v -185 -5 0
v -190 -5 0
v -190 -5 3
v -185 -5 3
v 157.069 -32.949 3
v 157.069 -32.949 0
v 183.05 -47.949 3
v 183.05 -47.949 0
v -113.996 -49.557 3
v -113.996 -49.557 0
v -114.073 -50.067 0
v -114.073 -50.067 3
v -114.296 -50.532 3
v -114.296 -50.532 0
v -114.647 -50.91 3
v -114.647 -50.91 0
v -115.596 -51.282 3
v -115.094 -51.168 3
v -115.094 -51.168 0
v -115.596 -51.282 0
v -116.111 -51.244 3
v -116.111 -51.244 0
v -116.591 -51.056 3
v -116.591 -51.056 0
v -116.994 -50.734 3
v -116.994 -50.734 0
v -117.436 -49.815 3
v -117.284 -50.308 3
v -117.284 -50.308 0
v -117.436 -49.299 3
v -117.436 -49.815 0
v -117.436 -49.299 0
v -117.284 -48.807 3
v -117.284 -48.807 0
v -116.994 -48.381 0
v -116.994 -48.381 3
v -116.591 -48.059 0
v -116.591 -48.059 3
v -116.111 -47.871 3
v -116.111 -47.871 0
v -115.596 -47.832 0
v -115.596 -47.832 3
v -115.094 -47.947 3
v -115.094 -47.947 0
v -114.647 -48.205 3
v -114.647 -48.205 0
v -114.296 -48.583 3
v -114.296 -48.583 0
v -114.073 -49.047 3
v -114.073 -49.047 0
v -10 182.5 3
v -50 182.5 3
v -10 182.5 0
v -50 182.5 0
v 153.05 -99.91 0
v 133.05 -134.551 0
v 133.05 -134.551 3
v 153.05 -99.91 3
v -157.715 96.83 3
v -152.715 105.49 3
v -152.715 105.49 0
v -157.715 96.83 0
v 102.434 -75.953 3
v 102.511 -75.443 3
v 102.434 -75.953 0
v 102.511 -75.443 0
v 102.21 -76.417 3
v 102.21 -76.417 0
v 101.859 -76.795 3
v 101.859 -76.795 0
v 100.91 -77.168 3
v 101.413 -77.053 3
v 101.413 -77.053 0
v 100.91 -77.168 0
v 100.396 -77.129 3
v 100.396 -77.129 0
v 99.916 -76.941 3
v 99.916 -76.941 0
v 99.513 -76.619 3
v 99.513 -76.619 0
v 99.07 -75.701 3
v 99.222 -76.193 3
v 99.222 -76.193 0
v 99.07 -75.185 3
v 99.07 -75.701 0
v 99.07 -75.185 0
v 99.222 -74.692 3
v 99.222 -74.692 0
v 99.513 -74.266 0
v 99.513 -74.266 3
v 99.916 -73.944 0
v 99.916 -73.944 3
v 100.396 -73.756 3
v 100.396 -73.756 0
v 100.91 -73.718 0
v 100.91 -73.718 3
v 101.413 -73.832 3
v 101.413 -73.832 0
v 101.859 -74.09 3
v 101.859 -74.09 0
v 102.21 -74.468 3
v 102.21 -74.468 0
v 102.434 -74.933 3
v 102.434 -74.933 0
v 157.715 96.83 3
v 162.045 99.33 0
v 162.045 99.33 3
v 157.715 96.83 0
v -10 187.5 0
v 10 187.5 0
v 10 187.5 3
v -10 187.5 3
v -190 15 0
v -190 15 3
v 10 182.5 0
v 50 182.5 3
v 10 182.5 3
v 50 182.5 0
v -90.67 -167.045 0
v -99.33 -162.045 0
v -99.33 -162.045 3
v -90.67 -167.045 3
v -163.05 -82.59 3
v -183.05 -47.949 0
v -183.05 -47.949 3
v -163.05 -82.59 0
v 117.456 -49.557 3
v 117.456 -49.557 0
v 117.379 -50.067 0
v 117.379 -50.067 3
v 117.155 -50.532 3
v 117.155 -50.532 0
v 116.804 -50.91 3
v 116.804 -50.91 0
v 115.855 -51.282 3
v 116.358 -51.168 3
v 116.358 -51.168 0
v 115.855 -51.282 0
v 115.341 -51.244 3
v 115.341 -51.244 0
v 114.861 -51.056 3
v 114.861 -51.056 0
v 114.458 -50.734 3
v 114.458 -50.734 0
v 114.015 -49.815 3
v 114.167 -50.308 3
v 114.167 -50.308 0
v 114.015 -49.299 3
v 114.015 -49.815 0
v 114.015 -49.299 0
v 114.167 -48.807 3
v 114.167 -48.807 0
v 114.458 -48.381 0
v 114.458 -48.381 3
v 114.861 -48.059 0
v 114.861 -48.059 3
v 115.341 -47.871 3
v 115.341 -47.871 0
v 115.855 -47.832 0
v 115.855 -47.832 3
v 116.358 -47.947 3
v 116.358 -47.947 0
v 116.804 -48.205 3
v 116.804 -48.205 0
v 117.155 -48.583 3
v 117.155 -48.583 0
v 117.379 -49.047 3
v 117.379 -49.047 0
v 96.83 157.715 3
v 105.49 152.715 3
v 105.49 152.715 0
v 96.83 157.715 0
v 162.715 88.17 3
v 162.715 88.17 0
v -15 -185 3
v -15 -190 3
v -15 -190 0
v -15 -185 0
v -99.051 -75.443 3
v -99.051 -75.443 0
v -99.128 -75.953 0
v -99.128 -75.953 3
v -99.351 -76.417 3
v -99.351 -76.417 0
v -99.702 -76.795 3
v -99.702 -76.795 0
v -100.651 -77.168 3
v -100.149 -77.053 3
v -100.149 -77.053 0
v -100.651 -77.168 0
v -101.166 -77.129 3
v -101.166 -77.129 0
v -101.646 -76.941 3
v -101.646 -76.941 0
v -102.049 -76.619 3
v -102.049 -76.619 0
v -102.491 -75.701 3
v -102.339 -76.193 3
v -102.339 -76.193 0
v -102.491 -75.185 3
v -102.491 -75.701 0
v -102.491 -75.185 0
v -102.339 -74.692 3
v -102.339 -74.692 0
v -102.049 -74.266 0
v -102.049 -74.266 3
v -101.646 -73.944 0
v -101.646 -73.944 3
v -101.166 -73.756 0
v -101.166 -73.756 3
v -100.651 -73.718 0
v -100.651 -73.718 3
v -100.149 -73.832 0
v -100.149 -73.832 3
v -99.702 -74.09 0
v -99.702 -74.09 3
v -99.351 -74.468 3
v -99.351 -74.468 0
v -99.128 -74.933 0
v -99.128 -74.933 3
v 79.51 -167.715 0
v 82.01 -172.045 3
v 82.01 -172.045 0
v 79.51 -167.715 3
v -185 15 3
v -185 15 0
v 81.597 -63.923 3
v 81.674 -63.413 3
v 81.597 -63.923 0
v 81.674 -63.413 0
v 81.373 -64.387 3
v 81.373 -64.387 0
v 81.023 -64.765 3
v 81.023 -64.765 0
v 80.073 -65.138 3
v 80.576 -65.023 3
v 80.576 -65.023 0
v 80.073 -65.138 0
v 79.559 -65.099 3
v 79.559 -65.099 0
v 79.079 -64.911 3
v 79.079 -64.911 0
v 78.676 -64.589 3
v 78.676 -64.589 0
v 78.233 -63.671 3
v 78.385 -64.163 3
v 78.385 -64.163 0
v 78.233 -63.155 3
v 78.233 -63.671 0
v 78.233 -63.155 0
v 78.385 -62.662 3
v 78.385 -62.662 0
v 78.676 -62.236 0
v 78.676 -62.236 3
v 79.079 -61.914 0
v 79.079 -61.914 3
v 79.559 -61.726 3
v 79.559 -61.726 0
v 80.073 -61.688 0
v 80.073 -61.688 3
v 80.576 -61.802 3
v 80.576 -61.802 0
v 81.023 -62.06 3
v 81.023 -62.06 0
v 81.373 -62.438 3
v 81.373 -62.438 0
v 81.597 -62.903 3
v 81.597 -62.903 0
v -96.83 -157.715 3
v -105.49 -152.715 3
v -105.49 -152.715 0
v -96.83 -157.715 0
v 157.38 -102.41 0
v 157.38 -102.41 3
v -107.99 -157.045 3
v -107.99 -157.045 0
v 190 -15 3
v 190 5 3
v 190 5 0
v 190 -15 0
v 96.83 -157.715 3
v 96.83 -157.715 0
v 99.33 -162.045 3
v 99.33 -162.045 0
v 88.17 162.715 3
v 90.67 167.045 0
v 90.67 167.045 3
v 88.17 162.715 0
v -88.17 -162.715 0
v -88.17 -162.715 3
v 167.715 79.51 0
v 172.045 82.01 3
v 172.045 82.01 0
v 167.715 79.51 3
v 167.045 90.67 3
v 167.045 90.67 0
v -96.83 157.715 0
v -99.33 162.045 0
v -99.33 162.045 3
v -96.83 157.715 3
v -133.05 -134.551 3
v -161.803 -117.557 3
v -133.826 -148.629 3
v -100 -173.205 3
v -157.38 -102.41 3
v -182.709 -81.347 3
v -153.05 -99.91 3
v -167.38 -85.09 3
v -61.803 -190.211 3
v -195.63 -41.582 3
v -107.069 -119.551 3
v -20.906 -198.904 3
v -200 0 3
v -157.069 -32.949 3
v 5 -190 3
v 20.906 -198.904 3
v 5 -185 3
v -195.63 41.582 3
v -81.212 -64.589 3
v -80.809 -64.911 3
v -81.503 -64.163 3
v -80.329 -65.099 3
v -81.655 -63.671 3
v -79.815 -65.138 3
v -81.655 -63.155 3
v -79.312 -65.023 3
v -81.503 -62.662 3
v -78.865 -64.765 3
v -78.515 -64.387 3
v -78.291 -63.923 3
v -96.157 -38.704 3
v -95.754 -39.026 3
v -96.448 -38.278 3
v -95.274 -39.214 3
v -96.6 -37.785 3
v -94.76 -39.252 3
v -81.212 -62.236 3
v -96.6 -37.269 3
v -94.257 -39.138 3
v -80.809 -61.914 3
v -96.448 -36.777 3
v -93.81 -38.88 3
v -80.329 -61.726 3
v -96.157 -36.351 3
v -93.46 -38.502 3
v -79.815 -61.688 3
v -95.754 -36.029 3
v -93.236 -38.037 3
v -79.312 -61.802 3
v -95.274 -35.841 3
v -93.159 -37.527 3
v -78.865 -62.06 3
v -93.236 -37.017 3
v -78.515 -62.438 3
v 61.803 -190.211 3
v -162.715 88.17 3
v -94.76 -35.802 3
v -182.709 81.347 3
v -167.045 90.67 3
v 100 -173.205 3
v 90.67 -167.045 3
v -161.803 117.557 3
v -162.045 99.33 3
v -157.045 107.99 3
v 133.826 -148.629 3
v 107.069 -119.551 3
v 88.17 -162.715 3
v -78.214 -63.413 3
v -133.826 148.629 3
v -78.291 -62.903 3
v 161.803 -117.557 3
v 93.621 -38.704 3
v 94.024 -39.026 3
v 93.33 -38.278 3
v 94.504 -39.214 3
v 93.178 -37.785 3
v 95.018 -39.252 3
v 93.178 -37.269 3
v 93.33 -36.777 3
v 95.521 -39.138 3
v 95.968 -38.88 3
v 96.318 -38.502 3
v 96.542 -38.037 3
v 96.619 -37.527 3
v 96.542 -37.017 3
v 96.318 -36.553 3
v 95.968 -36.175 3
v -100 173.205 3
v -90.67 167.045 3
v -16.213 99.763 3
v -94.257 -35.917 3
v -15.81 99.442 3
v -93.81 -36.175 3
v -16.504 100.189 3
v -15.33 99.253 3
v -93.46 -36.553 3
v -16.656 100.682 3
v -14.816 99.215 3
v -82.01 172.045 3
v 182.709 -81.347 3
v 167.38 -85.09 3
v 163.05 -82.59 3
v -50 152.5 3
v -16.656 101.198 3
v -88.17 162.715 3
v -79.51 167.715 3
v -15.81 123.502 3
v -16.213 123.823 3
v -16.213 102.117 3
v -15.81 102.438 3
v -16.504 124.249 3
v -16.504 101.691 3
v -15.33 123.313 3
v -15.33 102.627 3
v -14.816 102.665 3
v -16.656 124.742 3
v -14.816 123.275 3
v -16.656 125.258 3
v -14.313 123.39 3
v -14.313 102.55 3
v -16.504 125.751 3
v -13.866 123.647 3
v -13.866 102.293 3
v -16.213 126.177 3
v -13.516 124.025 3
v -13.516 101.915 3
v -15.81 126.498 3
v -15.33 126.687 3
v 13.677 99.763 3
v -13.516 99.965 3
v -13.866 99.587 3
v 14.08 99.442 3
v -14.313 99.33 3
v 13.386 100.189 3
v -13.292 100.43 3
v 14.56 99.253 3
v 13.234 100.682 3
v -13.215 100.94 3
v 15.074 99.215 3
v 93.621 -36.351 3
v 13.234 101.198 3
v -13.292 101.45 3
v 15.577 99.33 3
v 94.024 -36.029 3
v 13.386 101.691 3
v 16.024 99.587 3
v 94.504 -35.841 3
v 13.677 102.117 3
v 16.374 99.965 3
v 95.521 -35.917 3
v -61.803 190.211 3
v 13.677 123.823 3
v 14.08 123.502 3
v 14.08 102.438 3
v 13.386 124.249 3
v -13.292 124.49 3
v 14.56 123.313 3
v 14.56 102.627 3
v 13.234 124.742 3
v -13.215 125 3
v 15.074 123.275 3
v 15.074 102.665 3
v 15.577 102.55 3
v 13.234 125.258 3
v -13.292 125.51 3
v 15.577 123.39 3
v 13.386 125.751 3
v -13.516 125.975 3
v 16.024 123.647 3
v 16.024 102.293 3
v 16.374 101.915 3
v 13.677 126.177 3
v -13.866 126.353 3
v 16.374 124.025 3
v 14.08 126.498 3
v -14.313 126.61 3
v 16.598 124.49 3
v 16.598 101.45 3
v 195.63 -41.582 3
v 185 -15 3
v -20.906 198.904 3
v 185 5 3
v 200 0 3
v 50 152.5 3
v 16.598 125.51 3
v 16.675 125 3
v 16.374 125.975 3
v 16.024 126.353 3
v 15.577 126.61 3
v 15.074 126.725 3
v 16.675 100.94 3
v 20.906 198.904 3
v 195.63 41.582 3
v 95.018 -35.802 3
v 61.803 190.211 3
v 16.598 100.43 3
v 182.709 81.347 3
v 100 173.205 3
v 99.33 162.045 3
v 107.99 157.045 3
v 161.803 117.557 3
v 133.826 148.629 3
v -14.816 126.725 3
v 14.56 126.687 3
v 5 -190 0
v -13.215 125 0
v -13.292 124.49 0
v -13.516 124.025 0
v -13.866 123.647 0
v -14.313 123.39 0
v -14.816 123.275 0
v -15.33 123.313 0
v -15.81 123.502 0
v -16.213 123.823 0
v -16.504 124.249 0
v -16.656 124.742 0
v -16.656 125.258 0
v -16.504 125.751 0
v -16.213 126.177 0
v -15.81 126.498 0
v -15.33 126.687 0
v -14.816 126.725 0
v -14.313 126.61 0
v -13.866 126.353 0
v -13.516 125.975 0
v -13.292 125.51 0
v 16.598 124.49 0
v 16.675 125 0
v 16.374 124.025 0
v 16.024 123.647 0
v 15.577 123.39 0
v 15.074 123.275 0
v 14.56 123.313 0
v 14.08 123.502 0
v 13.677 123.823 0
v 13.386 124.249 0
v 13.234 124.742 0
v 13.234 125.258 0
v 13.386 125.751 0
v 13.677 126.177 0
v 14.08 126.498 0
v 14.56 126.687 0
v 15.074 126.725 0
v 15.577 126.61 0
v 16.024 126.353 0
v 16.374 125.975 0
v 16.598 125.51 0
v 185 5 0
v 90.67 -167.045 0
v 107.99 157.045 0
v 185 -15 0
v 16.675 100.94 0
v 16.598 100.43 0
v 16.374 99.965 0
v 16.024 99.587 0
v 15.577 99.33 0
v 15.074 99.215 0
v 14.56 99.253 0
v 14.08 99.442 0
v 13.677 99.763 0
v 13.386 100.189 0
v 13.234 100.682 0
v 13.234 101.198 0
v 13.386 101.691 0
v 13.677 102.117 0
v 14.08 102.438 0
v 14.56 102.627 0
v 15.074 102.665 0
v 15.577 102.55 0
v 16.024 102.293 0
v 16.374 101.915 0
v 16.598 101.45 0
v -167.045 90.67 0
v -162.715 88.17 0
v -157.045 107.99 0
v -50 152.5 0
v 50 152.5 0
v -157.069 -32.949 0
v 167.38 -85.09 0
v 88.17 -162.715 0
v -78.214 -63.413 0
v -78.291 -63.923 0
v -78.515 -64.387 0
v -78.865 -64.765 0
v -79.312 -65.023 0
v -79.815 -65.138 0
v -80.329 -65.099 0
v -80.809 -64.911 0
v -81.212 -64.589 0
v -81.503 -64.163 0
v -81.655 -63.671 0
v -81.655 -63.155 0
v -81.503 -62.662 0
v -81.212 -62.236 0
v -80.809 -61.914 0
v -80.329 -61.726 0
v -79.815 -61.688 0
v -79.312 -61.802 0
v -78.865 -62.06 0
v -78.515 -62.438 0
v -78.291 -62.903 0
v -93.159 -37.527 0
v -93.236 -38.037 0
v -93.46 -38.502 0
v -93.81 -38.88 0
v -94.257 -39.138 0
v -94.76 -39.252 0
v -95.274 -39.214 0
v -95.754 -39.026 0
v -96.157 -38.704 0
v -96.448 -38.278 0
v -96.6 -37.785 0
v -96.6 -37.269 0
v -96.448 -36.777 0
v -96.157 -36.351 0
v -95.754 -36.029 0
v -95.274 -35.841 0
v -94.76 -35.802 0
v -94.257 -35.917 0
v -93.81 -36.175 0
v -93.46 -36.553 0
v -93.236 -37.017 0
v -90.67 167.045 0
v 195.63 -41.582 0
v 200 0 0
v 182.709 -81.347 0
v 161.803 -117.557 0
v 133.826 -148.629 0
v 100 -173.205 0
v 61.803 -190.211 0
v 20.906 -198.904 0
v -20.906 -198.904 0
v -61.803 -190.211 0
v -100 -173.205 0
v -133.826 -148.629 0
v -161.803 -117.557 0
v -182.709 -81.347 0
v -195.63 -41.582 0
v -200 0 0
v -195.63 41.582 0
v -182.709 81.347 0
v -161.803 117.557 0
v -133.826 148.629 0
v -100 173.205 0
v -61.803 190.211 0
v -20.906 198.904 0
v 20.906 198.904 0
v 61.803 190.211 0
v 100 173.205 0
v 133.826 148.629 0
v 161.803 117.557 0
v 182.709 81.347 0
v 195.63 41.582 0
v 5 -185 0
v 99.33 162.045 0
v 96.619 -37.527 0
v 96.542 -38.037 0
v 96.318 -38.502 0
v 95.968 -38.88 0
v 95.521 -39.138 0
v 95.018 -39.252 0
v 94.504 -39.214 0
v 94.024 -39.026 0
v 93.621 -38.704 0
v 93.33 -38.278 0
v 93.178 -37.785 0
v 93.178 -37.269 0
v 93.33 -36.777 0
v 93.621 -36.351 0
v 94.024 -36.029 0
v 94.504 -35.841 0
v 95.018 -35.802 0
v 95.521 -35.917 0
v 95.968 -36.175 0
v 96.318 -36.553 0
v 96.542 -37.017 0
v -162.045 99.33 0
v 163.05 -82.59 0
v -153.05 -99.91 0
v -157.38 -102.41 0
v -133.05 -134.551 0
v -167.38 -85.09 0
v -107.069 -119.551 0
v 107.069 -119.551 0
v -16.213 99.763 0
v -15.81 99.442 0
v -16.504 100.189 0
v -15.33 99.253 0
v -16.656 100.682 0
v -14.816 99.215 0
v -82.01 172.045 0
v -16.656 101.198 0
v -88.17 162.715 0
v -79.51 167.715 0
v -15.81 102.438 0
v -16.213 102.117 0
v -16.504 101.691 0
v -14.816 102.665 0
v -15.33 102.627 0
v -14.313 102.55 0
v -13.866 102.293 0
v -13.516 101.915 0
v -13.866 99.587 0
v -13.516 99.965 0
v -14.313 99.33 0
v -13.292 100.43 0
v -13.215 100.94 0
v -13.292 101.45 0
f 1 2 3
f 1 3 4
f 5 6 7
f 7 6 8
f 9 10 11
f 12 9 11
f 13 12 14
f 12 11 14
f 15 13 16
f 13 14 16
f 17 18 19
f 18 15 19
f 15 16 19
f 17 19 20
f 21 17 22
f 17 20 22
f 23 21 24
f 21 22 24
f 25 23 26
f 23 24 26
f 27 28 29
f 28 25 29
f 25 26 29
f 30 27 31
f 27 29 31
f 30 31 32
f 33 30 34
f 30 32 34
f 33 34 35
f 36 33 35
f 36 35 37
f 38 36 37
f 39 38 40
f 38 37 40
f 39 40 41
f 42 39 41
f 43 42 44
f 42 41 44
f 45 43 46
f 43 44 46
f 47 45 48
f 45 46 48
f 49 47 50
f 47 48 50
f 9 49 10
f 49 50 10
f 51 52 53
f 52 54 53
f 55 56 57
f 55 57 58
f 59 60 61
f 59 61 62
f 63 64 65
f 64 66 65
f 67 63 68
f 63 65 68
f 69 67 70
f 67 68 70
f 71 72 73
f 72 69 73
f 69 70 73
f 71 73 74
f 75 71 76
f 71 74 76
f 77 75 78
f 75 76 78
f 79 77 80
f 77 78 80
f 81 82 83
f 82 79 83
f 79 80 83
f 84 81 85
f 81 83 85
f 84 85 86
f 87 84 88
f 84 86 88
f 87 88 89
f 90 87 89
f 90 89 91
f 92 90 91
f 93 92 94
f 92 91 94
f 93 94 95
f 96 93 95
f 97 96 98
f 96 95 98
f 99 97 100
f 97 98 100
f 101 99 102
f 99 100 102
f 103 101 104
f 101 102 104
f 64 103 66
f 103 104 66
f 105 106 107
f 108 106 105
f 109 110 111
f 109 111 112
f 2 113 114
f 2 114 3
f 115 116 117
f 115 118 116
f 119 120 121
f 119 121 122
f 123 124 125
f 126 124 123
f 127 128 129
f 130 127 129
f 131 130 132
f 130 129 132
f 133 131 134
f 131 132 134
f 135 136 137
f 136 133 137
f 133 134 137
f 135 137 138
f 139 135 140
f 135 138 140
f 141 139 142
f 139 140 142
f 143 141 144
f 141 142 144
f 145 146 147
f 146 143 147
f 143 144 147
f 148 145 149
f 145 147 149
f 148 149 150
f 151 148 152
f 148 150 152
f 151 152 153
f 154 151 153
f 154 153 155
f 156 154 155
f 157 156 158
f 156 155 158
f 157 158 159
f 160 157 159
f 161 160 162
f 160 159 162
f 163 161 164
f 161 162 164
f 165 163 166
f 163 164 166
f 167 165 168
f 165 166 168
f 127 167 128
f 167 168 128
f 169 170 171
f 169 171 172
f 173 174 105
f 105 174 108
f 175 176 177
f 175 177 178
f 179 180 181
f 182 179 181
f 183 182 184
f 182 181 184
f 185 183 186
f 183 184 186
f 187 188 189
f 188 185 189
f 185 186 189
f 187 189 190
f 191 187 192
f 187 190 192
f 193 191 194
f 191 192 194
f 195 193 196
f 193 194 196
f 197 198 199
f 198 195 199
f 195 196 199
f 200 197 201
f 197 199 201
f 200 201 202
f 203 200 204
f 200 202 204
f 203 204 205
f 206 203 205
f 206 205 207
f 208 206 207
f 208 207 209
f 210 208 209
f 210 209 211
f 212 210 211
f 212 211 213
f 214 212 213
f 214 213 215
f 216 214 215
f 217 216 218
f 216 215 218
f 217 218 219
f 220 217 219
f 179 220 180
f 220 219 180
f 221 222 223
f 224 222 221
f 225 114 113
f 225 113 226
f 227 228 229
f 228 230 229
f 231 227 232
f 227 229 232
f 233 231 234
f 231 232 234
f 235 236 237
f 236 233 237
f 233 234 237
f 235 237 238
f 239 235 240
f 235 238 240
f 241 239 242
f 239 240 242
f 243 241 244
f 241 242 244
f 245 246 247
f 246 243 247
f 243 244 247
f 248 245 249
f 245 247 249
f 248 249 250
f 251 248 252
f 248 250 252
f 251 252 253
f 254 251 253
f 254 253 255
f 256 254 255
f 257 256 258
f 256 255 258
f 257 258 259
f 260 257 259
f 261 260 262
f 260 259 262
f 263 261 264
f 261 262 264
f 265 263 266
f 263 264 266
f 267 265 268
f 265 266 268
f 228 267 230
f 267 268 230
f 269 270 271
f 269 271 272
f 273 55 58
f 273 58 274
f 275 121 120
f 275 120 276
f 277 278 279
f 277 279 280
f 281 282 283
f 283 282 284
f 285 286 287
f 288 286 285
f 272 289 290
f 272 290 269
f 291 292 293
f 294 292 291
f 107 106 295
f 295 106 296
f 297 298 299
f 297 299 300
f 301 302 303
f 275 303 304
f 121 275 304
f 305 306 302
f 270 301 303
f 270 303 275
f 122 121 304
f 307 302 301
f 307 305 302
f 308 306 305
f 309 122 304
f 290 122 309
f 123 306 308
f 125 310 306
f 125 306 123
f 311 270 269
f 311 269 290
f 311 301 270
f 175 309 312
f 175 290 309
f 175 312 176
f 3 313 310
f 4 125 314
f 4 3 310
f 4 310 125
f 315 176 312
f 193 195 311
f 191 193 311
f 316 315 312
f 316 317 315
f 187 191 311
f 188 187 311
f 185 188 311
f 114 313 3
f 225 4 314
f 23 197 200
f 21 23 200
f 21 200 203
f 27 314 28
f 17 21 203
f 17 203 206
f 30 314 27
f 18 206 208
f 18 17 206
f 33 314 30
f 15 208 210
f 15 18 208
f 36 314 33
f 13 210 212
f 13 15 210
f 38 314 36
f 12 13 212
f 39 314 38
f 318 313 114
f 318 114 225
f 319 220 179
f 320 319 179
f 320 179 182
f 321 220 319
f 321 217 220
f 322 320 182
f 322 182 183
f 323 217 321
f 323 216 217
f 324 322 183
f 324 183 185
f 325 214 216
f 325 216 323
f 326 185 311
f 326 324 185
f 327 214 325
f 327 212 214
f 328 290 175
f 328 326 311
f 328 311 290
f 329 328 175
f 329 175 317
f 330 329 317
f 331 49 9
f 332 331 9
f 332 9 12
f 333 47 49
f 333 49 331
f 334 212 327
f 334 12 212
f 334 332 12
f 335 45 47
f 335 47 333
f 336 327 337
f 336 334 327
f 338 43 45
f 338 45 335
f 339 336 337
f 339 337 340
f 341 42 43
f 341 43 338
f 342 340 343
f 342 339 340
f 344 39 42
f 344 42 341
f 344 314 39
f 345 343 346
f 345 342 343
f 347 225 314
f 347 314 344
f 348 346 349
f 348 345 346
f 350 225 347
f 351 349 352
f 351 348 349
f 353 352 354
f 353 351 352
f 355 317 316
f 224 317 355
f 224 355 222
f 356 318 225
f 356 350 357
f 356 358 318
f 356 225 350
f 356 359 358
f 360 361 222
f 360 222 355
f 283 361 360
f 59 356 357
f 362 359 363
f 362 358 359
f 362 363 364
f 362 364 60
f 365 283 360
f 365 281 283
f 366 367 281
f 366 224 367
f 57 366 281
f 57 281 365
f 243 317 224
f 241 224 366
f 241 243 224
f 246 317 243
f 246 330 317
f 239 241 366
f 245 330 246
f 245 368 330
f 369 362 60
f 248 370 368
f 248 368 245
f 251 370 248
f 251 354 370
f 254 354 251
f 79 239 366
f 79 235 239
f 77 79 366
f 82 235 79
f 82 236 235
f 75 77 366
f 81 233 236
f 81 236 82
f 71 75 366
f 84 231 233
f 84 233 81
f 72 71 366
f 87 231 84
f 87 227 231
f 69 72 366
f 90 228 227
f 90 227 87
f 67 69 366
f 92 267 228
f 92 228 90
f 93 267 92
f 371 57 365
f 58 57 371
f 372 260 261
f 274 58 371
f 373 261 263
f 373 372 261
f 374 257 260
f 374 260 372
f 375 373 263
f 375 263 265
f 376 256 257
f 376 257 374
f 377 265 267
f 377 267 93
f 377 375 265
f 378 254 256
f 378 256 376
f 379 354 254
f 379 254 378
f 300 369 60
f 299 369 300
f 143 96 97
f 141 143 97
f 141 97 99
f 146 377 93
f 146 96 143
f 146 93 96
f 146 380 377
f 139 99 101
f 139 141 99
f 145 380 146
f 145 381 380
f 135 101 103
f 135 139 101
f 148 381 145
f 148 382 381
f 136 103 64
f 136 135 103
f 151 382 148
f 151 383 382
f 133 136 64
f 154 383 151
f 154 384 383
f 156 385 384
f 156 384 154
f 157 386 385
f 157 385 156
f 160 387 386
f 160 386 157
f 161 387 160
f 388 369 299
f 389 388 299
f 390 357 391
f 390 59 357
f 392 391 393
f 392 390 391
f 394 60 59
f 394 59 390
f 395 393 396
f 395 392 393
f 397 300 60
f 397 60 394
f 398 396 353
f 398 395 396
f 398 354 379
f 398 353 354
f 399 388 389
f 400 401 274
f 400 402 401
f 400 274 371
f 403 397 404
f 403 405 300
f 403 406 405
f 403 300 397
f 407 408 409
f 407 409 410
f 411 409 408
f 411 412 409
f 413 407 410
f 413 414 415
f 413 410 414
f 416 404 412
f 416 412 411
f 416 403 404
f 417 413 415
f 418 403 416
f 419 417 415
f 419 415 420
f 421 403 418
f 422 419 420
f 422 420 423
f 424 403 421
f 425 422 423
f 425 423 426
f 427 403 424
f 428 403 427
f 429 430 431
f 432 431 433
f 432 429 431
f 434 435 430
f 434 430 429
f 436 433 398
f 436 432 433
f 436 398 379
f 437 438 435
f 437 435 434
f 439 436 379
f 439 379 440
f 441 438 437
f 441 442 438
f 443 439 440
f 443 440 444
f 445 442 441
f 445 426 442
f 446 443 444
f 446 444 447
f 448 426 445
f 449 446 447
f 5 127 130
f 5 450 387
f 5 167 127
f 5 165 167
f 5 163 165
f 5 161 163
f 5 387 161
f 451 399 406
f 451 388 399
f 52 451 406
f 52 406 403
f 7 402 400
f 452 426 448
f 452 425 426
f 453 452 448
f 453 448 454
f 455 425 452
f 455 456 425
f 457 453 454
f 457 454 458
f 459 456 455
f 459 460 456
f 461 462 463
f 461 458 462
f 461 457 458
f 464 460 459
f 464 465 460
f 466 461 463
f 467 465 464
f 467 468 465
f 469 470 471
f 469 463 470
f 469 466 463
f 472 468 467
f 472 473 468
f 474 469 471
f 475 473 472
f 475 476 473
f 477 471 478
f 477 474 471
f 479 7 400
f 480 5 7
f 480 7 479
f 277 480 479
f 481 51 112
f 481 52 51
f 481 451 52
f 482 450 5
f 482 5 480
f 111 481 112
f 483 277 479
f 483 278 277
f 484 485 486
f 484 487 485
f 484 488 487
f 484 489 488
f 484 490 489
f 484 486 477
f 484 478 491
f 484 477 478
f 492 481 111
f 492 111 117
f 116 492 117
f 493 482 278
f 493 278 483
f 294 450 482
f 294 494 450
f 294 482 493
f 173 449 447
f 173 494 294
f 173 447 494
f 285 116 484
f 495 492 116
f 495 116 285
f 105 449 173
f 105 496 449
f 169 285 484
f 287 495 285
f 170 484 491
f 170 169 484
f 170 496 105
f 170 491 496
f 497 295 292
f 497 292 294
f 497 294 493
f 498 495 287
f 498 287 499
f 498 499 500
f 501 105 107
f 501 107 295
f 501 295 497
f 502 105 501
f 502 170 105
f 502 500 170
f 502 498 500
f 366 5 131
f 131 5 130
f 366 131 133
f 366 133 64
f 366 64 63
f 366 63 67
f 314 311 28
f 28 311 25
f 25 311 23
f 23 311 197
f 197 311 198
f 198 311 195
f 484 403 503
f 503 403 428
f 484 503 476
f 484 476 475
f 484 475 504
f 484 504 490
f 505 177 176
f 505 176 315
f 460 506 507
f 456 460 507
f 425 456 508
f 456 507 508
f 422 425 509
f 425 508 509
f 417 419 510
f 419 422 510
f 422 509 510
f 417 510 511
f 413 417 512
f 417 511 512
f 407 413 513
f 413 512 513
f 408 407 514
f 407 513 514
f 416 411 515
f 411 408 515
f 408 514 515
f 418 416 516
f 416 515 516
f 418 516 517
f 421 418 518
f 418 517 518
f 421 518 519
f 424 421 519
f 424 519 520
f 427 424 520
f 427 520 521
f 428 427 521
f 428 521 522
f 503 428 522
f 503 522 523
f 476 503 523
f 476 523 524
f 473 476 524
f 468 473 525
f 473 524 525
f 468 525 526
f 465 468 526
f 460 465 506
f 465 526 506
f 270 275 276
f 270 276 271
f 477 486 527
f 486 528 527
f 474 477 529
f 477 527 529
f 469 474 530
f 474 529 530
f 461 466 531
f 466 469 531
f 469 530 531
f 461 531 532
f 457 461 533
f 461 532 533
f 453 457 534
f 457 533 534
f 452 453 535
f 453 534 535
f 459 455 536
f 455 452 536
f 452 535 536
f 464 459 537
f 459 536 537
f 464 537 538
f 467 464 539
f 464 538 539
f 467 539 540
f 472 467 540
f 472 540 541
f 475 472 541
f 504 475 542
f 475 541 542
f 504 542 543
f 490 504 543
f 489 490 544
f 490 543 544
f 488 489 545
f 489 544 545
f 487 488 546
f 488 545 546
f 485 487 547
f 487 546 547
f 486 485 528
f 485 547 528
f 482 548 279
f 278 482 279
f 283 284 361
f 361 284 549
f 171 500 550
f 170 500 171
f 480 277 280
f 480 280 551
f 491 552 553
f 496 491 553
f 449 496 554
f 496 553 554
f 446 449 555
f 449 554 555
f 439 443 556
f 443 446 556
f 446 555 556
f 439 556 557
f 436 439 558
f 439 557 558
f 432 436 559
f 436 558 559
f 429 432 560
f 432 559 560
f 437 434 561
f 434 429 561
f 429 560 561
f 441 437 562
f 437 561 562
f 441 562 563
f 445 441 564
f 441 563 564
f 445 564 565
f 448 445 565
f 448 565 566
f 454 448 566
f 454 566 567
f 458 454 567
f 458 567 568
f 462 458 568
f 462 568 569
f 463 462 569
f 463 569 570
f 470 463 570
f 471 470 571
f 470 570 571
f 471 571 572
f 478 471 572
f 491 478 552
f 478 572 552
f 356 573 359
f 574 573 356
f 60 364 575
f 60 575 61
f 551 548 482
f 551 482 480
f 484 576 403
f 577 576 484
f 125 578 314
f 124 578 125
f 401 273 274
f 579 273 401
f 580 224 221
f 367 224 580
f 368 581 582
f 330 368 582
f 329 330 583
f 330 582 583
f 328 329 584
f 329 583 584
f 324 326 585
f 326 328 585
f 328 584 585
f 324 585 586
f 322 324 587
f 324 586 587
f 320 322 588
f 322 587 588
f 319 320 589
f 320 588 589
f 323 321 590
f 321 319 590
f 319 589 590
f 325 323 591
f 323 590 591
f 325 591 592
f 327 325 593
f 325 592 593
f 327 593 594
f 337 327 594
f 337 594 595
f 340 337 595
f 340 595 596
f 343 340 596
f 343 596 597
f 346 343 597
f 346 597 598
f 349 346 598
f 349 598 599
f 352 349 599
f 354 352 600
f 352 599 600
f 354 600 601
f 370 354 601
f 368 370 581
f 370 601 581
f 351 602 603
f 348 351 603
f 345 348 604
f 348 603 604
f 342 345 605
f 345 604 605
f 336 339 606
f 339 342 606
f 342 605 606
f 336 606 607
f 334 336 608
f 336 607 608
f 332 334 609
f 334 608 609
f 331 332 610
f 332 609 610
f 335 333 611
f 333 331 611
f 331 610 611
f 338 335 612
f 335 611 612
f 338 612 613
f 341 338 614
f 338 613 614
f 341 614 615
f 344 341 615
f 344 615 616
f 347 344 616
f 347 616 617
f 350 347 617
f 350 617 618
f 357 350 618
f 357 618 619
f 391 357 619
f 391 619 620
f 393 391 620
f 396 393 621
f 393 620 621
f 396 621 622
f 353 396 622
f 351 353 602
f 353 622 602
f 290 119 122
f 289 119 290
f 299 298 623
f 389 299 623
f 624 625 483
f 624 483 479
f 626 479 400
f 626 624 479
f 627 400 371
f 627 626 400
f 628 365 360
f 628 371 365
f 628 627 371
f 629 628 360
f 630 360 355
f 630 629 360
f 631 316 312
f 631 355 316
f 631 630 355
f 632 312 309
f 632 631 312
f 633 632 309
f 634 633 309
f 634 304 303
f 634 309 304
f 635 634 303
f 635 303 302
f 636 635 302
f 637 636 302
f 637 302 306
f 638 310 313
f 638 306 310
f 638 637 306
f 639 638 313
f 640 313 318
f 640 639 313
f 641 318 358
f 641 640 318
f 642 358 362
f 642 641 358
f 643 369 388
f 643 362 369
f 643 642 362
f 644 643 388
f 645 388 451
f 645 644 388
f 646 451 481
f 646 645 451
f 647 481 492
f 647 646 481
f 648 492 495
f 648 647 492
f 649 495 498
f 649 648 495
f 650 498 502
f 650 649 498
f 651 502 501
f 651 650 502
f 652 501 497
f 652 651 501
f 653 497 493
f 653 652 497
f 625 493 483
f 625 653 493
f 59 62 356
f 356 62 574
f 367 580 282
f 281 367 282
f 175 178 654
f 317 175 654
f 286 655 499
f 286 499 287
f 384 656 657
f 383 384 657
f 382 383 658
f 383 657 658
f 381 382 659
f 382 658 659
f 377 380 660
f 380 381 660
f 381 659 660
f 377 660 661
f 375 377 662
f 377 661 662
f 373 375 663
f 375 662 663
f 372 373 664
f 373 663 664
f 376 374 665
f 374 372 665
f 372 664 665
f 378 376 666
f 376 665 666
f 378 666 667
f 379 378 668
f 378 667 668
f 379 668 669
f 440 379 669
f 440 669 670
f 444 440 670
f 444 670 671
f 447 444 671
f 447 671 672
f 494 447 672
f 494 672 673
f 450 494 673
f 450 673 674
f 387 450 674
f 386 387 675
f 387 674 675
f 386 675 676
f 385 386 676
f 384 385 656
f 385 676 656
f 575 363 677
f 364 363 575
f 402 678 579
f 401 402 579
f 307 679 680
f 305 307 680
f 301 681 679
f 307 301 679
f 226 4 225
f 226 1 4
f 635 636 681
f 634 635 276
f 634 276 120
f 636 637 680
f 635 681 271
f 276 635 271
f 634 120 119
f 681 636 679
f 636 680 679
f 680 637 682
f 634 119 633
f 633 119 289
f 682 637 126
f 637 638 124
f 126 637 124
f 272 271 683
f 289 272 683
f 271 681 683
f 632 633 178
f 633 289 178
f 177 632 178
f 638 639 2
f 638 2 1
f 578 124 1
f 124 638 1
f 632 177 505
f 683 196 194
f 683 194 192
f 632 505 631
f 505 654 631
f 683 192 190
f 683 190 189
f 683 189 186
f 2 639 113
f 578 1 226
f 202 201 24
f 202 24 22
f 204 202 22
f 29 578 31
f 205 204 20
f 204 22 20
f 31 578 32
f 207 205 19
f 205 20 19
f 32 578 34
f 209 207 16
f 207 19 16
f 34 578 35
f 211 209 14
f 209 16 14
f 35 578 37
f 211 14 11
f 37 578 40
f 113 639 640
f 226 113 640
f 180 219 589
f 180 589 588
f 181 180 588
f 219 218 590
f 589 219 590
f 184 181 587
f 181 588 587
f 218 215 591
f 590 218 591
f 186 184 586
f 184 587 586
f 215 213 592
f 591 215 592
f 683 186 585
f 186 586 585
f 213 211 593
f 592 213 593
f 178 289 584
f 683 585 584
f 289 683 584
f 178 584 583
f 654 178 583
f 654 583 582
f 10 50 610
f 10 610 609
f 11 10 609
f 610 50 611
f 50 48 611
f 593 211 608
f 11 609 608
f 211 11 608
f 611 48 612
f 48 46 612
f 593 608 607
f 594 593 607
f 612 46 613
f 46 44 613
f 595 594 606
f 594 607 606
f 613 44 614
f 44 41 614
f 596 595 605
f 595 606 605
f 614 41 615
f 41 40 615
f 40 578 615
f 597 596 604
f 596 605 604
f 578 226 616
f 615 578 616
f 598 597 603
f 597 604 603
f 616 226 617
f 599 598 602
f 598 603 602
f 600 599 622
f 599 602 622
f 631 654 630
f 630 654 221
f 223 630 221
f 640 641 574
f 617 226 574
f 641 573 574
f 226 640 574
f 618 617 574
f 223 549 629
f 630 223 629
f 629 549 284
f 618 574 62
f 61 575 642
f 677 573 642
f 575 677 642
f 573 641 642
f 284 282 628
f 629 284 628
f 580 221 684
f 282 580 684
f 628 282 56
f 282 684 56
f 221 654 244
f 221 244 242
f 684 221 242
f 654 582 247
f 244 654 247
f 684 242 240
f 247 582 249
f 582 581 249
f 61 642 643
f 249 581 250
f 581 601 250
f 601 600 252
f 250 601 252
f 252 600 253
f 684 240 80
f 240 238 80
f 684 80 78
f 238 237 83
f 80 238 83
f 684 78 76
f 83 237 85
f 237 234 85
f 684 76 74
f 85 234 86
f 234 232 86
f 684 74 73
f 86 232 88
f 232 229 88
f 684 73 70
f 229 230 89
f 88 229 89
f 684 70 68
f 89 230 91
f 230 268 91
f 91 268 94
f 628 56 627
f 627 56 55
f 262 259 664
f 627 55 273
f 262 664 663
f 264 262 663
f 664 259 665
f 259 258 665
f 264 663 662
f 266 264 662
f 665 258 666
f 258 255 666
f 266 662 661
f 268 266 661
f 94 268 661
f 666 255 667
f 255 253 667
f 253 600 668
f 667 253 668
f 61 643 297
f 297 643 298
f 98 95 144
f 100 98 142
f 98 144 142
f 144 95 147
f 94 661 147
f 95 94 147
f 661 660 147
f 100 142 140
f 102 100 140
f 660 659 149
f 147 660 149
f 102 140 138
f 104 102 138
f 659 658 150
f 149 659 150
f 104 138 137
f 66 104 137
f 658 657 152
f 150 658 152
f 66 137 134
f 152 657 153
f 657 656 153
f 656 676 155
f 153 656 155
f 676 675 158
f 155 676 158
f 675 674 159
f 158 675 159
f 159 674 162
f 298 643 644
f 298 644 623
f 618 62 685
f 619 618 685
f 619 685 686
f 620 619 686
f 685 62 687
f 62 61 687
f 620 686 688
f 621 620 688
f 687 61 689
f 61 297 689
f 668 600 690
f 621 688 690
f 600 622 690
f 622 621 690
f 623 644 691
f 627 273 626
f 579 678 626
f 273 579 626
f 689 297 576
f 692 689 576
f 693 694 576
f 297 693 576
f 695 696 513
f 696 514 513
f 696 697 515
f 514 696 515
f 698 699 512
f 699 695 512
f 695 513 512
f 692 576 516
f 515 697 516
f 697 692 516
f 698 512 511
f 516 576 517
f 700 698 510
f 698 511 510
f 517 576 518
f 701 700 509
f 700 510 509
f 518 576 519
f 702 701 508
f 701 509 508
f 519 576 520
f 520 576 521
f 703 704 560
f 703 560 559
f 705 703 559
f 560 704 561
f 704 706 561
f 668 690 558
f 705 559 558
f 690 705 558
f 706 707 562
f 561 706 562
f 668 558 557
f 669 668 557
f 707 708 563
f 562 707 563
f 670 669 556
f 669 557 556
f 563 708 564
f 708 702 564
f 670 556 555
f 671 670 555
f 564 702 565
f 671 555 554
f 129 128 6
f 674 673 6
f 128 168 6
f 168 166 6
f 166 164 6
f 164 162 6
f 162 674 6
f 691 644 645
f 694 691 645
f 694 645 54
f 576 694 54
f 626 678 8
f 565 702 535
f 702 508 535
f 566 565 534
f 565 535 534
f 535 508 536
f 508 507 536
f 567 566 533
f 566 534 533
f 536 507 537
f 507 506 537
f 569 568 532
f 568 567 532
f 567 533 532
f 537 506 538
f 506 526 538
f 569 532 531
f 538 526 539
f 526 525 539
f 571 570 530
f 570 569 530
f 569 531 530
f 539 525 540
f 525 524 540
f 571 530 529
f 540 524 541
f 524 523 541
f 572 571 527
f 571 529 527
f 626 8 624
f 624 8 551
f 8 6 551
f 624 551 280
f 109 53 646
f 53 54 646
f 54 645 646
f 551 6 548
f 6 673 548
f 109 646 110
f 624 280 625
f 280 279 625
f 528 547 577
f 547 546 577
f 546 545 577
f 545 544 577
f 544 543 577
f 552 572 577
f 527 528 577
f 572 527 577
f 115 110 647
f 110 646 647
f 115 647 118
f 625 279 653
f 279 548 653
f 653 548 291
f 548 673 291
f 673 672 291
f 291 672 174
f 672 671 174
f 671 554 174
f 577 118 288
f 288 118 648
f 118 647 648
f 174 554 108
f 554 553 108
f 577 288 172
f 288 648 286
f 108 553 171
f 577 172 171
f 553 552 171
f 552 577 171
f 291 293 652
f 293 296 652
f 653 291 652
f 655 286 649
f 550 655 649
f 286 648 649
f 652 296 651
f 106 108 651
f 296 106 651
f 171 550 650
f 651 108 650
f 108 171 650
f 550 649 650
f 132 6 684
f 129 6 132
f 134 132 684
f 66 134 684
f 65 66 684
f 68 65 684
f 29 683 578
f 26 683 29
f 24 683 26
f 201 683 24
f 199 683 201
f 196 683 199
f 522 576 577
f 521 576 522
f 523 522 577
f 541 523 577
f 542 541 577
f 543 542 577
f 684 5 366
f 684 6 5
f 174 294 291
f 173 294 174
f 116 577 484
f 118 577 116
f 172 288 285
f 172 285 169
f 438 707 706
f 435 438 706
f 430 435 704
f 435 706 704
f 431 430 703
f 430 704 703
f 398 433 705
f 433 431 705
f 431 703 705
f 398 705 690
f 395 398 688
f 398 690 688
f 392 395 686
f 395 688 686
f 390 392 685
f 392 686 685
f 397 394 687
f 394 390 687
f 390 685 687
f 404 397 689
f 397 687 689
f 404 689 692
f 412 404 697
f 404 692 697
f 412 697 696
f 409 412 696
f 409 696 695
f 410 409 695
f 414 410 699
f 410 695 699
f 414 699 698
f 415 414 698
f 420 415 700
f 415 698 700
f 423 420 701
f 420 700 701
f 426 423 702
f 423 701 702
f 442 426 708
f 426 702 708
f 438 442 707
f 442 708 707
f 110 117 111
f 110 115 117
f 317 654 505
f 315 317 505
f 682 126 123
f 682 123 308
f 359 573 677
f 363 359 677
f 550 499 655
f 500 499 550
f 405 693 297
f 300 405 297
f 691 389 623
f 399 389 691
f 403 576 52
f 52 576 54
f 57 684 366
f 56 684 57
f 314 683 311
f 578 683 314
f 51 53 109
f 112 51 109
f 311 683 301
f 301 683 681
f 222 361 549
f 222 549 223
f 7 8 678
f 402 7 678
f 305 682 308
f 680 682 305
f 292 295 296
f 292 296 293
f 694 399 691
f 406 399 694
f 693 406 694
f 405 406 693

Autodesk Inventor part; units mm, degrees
ref_plane "YZ Plane" through (0, 0, 0) normal (1, 0, 0) x (0, 1, 0)
ref_plane "XZ Plane" through (0, 0, 0) normal (0, 1, 0) x (-1, 0, 0)
ref_plane "XY Plane" through (0, 0, 0) normal (0, 0, 1) x (1, 0, 0)
sketch "Sketch1" plane through (0, 0, 0) normal (0, 0, 1) x (1, 0, 0)
  circle A0 centre (0, 0) radius 200
  line L0 (90.6699, 167.0448) -> (88.1699, 162.7147)
  line L1 (96.8301, 157.7147) -> (99.3301, 162.0448)
  line L2 (162.0448, 99.3301) -> (157.7147, 96.8301)
  line L3 (162.7147, 88.1699) -> (167.0448, 90.6699)
  line L4 (185, 5) -> (190, 5)
  line L5 (190, -5) -> (185, -5)
  line L6 (88.1699, -162.7147) -> (96.8301, -157.7147)
  line L7 (99.3301, -162.0448) -> (90.6699, -167.0448)
  line L8 (-5, -190) -> (-5, -185)
  line L9 (5, -185) -> (5, -190)
  line L10 (-99.3301, -162.0448) -> (-90.6699, -167.0448)
  line L11 (-88.1699, -162.7147) -> (-96.8301, -157.7147)
  line L12 (-190, 5) -> (-190, -5)
  line L13 (-190, -5) -> (-185, -5)
  line L14 (-185, -5) -> (-185, 5)
  line L15 (-167.0448, 90.6699) -> (-162.0448, 99.3301)
  line L16 (-157.7147, 96.8301) -> (-162.7147, 88.1699)
  line L17 (-99.3301, 162.0448) -> (-90.6699, 167.0448)
  line L18 (-88.1699, 162.7147) -> (-96.8301, 157.7147)
  line L19 (-190, -5) -> (-190, 5)
  line L20 (-185, 5) -> (-185, -5)
  line L21 (88.1699, 162.7147) -> (96.8301, 157.7147)
  line L22 (99.3301, 162.0448) -> (90.6699, 167.0448)
  line L23 (162.7147, 88.1699) -> (157.7147, 96.8301)
  line L24 (162.0448, 99.3301) -> (167.0448, 90.6699)
  line L25 (185, 5) -> (185, -5)
  line L26 (190, 5) -> (190, -5)
  line L27 (96.8301, -157.7147) -> (99.3301, -162.0448)
  line L28 (88.1699, -162.7147) -> (90.6699, -167.0448)
  line L29 (-5, -185) -> (5, -185)
  line L30 (-5, -190) -> (5, -190)
  line L31 (-99.3301, -162.0448) -> (-96.8301, -157.7147)
  line L32 (-90.6699, -167.0448) -> (-88.1699, -162.7147)
  line L33 (-190, 5) -> (-185, 5)
  line L34 (-162.0448, 99.3301) -> (-157.7147, 96.8301)
  line L35 (-167.0448, 90.6699) -> (-162.7147, 88.1699)
  line L36 (-99.3301, 162.0448) -> (-96.8301, 157.7147)
  line L37 (-90.6699, 167.0448) -> (-88.1699, 162.7147)
  line L38 (50, 182.5) -> (10, 182.5)
  line L39 (10, 182.5) -> (10, 187.5)
  line L40 (10, 187.5) -> (0, 187.5)
  line L41 (157.7147, 96.8301) -> (162.0448, 99.3301)
  line L42 (167.0448, 90.6699) -> (162.7147, 88.1699)
  line L43 (-99.3301, -162.0448) -> (-96.8301, -157.7147)
  line L44 (-88.1699, -162.7147) -> (-90.6699, -167.0448)
  line L45 (-99.3301, -162.0448) -> (-96.8301, -157.7147)
  line L46 (-88.1699, -162.7147) -> (-90.6699, -167.0448)
  line L47 (-99.3301, -162.0448) -> (-90.6699, -167.0448)
  circle A1 centre (14.945, 125) radius 1.73
  circle A2 centre (14.945, 100.94) radius 1.73
  circle A3 centre (-14.945, 100.94) radius 1.73
  circle A4 centre (-14.945, 125) radius 1.73
  circle A5 centre (-100.7807, -75.4427) radius 1.73
  circle A6 centre (-115.7257, -49.5573) radius 1.73
  circle A7 centre (-79.9441, -63.4127) radius 1.73
  circle A8 centre (-94.8891, -37.5273) radius 1.73
  circle A9 centre (115.7257, -49.5573) radius 1.73
  circle A10 centre (100.7807, -75.4427) radius 1.73
  circle A11 centre (94.8891, -37.5273) radius 1.73
  circle A12 centre (79.9441, -63.4127) radius 1.73
  line L48 (0, 152.5) -> (50, 152.5)
  line L49 (50, 152.5) -> (50, 182.5)
  line L50 (-10, 182.5) -> (-10, 187.5)
  line L51 (-10, 187.5) -> (0, 187.5)
  line L52 (-50, 182.5) -> (-10, 182.5)
  line L53 (0, 152.5) -> (-50, 152.5)
  line L54 (-50, 152.5) -> (-50, 182.5)
  circle A13 centre (0, 0) radius 200
  line L55 (-163.0496, -82.5897) -> (-167.3798, -85.0897)
  line L56 (-167.3798, -85.0897) -> (-162.3798, -93.75)
  line L57 (-183.0496, -47.9487) -> (-163.0496, -82.5897)
  line L58 (-132.0689, -76.25) -> (-157.0689, -32.9487)
  line L59 (-157.0689, -32.9487) -> (-183.0496, -47.9487)
  line L60 (-132.0689, -76.25) -> (-107.0689, -119.5513)
  line L61 (-157.3798, -102.4103) -> (-162.3798, -93.75)
  line L62 (-153.0496, -99.9103) -> (-157.3798, -102.4103)
  line L63 (-133.0496, -134.5513) -> (-153.0496, -99.9103)
  line L64 (-107.0689, -119.5513) -> (-133.0496, -134.5513)
  circle A14 centre (0, 0) radius 200
  line L65 (153.0496, -99.9103) -> (157.3798, -102.4103)
  line L66 (157.3798, -102.4103) -> (162.3798, -93.75)
  line L67 (133.0496, -134.5513) -> (153.0496, -99.9103)
  line L68 (132.0689, -76.25) -> (107.0689, -119.5513)
  line L69 (107.0689, -119.5513) -> (133.0496, -134.5513)
  line L70 (132.0689, -76.25) -> (157.0689, -32.9487)
  line L71 (167.3798, -85.0897) -> (162.3798, -93.75)
  line L72 (163.0496, -82.5897) -> (167.3798, -85.0897)
  line L73 (183.0496, -47.9487) -> (163.0496, -82.5897)
  line L74 (157.0689, -32.9487) -> (183.0496, -47.9487)
  dimension "d6" = 40
  dimension "d8" = 3.46
  dimension "d9" = 360
  dimension "d11" = 50
  dimension "d14" = 360
extrude "Extrusion1" add sketch "Sketch1" along normal blind 3
sketch "Sketch2" plane through (0, 0, 3) normal (0, 0, 1) x (1, 0, 0)
  line L0 (99.3301, 162.0448) -> (96.8301, 157.7147) projected
  line L1 (99.3301, 162.0448) -> (107.9904, 157.0448)
  line L2 (99.3301, 162.0448) -> (109.3301, 162.0448) construction
  line L3 (107.9904, 157.0448) -> (105.4904, 152.7147)
  line L4 (105.4904, 152.7147) -> (96.8301, 157.7147)
  circle A0 centre (0, 0) radius 200
  line L5 (96.8301, 157.7147) -> (99.3301, 162.0448)
  line L6 (5, 190) -> (15, 190)
  line L7 (5, 190) -> (13.6603, 195) construction
  line L8 (15, 190) -> (15, 185)
  line L9 (15, 185) -> (5, 185)
  line L10 (5, 185) -> (5, 190)
  line L11 (-90.6699, 167.0448) -> (-82.0096, 172.0448)
  line L12 (-90.6699, 167.0448) -> (-85.6699, 175.7051) construction
  line L13 (-82.0096, 172.0448) -> (-79.5096, 167.7147)
  line L14 (-79.5096, 167.7147) -> (-88.1699, 162.7147)
  line L15 (-88.1699, 162.7147) -> (-90.6699, 167.0448)
  line L16 (-162.0448, 99.3301) -> (-157.0448, 107.9904)
  line L17 (-162.0448, 99.3301) -> (-162.0448, 109.3301) construction
  line L18 (-157.0448, 107.9904) -> (-152.7147, 105.4904)
  line L19 (-152.7147, 105.4904) -> (-157.7147, 96.8301)
  line L20 (-157.7147, 96.8301) -> (-162.0448, 99.3301)
  line L21 (-190, 5) -> (-190, 15)
  line L22 (-190, 5) -> (-195, 13.6603) construction
  line L23 (-190, 15) -> (-185, 15)
  line L24 (-185, 15) -> (-185, 5)
  line L25 (-185, 5) -> (-190, 5)
  line L26 (-167.0448, -90.6699) -> (-172.0448, -82.0096)
  line L27 (-167.0448, -90.6699) -> (-175.7051, -85.6699) construction
  line L28 (-172.0448, -82.0096) -> (-167.7147, -79.5096)
  line L29 (-167.7147, -79.5096) -> (-162.7147, -88.1699)
  line L30 (-162.7147, -88.1699) -> (-167.0448, -90.6699)
  line L31 (-99.3301, -162.0448) -> (-107.9904, -157.0448)
  line L32 (-99.3301, -162.0448) -> (-109.3301, -162.0448) construction
  line L33 (-107.9904, -157.0448) -> (-105.4904, -152.7147)
  line L34 (-105.4904, -152.7147) -> (-96.8301, -157.7147)
  line L35 (-96.8301, -157.7147) -> (-99.3301, -162.0448)
  line L36 (-5, -190) -> (-15, -190)
  line L37 (-5, -190) -> (-13.6603, -195) construction
  line L38 (-15, -190) -> (-15, -185)
  line L39 (-15, -185) -> (-5, -185)
  line L40 (-5, -185) -> (-5, -190)
  line L41 (90.6699, -167.0448) -> (82.0096, -172.0448)
  line L42 (90.6699, -167.0448) -> (85.6699, -175.7051) construction
  line L43 (82.0096, -172.0448) -> (79.5096, -167.7147)
  line L44 (79.5096, -167.7147) -> (88.1699, -162.7147)
  line L45 (88.1699, -162.7147) -> (90.6699, -167.0448)
  line L46 (162.0448, -99.3301) -> (157.0448, -107.9904)
  line L47 (162.0448, -99.3301) -> (162.0448, -109.3301) construction
  line L48 (157.0448, -107.9904) -> (152.7147, -105.4904)
  line L49 (152.7147, -105.4904) -> (157.7147, -96.8301)
  line L50 (157.7147, -96.8301) -> (162.0448, -99.3301)
  line L51 (190, -5) -> (190, -15)
  line L52 (190, -5) -> (195, -13.6603) construction
  line L53 (190, -15) -> (185, -15)
  line L54 (185, -15) -> (185, -5)
  line L55 (185, -5) -> (190, -5)
  line L56 (167.0448, 90.6699) -> (172.0448, 82.0096)
  line L57 (167.0448, 90.6699) -> (175.7051, 85.6699) construction
  line L58 (172.0448, 82.0096) -> (167.7147, 79.5096)
  line L59 (167.7147, 79.5096) -> (162.7147, 88.1699)
  line L60 (162.7147, 88.1699) -> (167.0448, 90.6699)
  dimension "d18" = 10
  dimension "d19" = 30
  dimension "d22" = 360
extrude "Extrusion2" cut sketch "Sketch2" against normal blind 10 contours L1 L3 L4 L0 | L11 L13 L14 L15 | L16 L18 L19 L20 | L21 L23 L24 L25 | L31 L33 L34 L35 | L36 L38 L39 L40 | L41 L43 L44 L45 | L51 L53 L54 L55 | L56 L58 L59 L60
properties part number "denew"
